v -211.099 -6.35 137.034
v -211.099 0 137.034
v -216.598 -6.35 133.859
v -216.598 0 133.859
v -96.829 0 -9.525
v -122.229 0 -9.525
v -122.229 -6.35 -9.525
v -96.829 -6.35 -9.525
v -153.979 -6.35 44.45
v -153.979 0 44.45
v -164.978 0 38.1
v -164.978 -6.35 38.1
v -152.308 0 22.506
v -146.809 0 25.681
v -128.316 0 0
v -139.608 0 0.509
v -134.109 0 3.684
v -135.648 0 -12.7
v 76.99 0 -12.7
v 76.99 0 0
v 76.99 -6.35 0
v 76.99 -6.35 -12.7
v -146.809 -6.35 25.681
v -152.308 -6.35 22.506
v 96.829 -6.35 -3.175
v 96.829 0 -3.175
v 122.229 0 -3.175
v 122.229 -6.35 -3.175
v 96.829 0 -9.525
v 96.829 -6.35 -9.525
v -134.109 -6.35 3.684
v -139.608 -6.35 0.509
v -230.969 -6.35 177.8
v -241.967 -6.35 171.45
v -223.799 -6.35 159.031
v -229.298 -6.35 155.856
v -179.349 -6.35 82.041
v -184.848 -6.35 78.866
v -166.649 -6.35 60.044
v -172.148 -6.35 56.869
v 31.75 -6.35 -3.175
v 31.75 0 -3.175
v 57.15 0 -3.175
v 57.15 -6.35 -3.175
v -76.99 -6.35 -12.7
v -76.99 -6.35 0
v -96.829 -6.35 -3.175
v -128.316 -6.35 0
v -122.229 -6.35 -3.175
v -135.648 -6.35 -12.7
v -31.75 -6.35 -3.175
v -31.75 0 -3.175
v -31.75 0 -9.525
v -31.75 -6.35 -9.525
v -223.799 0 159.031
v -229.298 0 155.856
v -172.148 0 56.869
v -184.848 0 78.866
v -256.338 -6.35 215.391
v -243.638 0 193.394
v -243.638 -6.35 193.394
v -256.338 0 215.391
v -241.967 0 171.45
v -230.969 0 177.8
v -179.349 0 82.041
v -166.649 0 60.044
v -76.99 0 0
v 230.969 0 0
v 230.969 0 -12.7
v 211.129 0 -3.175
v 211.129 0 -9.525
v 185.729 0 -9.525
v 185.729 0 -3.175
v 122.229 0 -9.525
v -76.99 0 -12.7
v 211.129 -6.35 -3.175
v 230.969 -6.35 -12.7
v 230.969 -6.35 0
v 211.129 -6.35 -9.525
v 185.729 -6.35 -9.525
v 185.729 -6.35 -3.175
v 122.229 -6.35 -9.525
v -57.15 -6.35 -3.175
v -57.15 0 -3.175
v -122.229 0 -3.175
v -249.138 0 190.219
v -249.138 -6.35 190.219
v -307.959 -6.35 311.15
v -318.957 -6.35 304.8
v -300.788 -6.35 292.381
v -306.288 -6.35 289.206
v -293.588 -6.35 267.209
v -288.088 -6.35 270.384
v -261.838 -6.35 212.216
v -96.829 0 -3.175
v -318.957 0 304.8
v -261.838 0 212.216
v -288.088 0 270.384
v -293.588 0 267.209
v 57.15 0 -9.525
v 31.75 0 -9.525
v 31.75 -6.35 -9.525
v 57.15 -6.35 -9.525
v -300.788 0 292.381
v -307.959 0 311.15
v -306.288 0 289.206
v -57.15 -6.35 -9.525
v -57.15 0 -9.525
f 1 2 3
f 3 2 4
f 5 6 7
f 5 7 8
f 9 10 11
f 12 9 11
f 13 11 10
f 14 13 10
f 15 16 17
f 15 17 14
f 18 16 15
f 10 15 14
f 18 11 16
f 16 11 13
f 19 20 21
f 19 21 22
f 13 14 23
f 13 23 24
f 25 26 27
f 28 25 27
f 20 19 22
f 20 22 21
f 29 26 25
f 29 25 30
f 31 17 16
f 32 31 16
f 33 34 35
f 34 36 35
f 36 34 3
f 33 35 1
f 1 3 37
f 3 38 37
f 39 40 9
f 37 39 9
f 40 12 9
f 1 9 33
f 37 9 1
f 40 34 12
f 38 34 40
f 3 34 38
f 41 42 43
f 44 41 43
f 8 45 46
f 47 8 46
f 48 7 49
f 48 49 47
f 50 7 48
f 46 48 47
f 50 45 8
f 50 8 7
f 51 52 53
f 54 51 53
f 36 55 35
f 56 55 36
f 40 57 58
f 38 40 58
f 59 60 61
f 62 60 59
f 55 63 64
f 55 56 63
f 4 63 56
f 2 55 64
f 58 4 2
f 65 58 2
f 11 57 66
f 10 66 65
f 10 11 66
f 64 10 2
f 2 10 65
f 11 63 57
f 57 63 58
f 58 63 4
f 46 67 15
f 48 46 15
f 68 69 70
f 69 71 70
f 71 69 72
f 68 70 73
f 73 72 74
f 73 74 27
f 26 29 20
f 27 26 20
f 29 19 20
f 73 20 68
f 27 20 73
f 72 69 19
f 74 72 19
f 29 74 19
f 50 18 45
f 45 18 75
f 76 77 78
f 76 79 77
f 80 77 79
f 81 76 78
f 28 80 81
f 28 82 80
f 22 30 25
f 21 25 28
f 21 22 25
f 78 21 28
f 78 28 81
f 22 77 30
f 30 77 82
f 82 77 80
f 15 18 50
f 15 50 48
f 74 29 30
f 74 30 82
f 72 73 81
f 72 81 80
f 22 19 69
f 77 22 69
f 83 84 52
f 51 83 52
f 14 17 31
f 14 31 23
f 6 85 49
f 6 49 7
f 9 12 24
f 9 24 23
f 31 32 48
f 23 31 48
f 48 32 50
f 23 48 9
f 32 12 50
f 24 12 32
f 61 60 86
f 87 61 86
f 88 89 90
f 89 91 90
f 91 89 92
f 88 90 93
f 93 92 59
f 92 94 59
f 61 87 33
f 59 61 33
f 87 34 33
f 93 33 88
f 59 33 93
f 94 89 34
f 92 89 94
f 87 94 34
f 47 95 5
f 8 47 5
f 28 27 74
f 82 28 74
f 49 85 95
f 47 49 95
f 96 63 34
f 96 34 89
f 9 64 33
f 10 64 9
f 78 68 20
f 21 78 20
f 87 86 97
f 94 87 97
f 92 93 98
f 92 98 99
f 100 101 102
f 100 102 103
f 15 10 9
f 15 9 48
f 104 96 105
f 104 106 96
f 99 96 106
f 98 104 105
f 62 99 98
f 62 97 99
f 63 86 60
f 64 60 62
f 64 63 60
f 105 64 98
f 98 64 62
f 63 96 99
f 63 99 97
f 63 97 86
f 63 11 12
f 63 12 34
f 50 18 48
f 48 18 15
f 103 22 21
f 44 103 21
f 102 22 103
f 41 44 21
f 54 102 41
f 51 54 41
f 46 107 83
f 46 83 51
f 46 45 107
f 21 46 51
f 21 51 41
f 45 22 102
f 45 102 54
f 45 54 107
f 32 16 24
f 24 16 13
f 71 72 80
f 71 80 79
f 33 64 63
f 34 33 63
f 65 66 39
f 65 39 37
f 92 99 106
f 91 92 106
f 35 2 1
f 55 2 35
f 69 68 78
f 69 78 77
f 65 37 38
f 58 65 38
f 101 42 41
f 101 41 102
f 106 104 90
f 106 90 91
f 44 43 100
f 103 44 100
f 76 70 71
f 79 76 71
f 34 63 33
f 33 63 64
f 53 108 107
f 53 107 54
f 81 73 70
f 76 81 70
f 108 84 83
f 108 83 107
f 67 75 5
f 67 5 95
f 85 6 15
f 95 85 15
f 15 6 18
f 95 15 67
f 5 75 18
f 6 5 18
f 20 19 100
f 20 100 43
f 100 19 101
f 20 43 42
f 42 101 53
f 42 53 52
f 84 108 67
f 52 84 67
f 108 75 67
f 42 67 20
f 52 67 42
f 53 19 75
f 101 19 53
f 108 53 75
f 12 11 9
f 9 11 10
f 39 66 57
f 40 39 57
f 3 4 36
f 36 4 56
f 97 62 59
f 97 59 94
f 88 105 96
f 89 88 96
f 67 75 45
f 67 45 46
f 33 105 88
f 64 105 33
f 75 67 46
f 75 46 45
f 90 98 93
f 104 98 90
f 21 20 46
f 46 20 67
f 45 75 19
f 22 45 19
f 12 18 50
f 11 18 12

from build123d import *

# Parameters (mm, degrees)
BOSS_EXTRUDE1_DEPTH = 6.35
CUT_EXTRUDE4_DEPTH  = 155.110195964
BOSS_EXTRUDE4_DEPTH = 6.35
CIRPATTERN1_COUNT   = 2
CIRPATTERN1_ANGLE   = 60
SKETCH12_W          = 153.979316792
SKETCH12_H          = 120.65
CUT_EXTRUDE5_DEPTH  = 155.110195964
SKETCH13_W          = 25.4
SKETCH13_H          = 6.35
CUT_EXTRUDE6_DEPTH  = 90.126497182
LPATTERN1_COUNT     = 5
LPATTERN1_PITCH     = 153.979316882
LPATTERN1_2_COUNT   = 2
LPATTERN1_2_PITCH   = 153.979316882
SKETCH14_W          = 25.4
SKETCH14_H          = 6.35
CUT_EXTRUDE7_DEPTH  = 695.360232872
CUT_EXTRUDE8_DEPTH  = 600.270912242


with BuildPart() as part:
    # Sketch1 → Boss-Extrude1 (new body)
    with BuildSketch(Plane(origin=(0, 0, 0), x_dir=(1, 0, 0), z_dir=(0, 1, 0))):
        Polygon((-76.989658396, 0), (0, -44.45), (76.989658396, 0), (76.989658396, 88.9), (0, 133.35), (-76.989658396, 88.9), align=None)
    extrude(amount=-BOSS_EXTRUDE1_DEPTH)

    # Sketch10 → Cut-Extrude4 (cut, through all)
    with BuildSketch(Plane(origin=(0, 0, 0), x_dir=(1, 0, 0), z_dir=(0, 1, 0))):
        Polygon((-21.997045256, -31.75), (-13.322783942, -29.425738686), (-35.319829198, -16.725738686), (-38.494829198, -22.225), align=None)
    cut_extrude4 = extrude(amount=-CUT_EXTRUDE4_DEPTH, mode=Mode.SUBTRACT)

    # Sketch11 → Boss-Extrude4 (add)
    with BuildSketch(Plane(origin=(0, 0, 0), x_dir=(1, 0, 0), z_dir=(0, 1, 0))):
        Polygon((-38.494829198, -22.225), (-41.669829198, -27.724261314), (-63.666874454, -15.024261314), (-54.99261314, -12.7), align=None)
    boss_extrude4 = extrude(amount=-BOSS_EXTRUDE4_DEPTH)

    # CirPattern1: Cut-Extrude4, Boss-Extrude4 ×2 about axis
    cirpattern1_axis = Axis((0, 0, -44.45), (0, 1, 0))
    add([cut_extrude4.rotate(cirpattern1_axis, i * CIRPATTERN1_ANGLE / (CIRPATTERN1_COUNT - 1)) for i in range(1, CIRPATTERN1_COUNT)], mode=Mode.SUBTRACT)
    add([boss_extrude4.rotate(cirpattern1_axis, i * CIRPATTERN1_ANGLE / (CIRPATTERN1_COUNT - 1)) for i in range(1, CIRPATTERN1_COUNT)])

    # Sketch12 → Cut-Extrude5 (cut, through all)
    with BuildSketch(Plane(origin=(0, 0, 0), x_dir=(1, 0, 0), z_dir=(0, 1, 0))):
        with Locations((0, 73.025)):
            Rectangle(SKETCH12_W, SKETCH12_H)
    extrude(amount=-CUT_EXTRUDE5_DEPTH, mode=Mode.SUBTRACT)

    # Sketch13 → Cut-Extrude6 (cut, through all)
    with BuildSketch(Plane(origin=(0, 0, 0), x_dir=(1, 0, 0), z_dir=(0, 1, 0))):
        with Locations((-44.45, 6.35)):
            Rectangle(SKETCH13_W, SKETCH13_H)
        with Locations((44.45, 6.35)):
            Rectangle(SKETCH13_W, SKETCH13_H)
    extrude(amount=-CUT_EXTRUDE6_DEPTH, mode=Mode.SUBTRACT)


with BuildPart() as lpattern1_1:
    # LPattern1: pattern copy
    add(part.part.moved(Location(Vector(1, 0, 0) * (1 * LPATTERN1_PITCH))))


with BuildPart() as lpattern1_2:
    # LPattern1: pattern copy
    add(part.part.moved(Location(Vector(1, 0, 0) * (2 * LPATTERN1_PITCH))))


with BuildPart() as lpattern1_3:
    # LPattern1: pattern copy
    add(part.part.moved(Location(Vector(1, 0, 0) * (3 * LPATTERN1_PITCH))))


with BuildPart() as lpattern1_4:
    # LPattern1: pattern copy
    add(part.part.moved(Location(Vector(1, 0, 0) * (4 * LPATTERN1_PITCH))))


with BuildPart() as lpattern1_2_1:
    # LPattern1 2: pattern copy
    add(part.part.moved(Location(Vector(-1, 0, 0) * (1 * LPATTERN1_2_PITCH))))


with BuildPart() as cut_extrude7_tool:
    # Sketch14 → Cut-Extrude7 (new, through all)
    # profile 1 of 2: a face of its own
    with BuildSketch(Plane(origin=(0, 0, 0), x_dir=(1, 0, 0), z_dir=(0, 1, 0))):
        Polygon((593.920222272, -31.75), (615.917267528, -44.45), (637.914312784, -31.75), (635.59005147, -40.424261314), (657.587096726, -27.724261314), (651.237096726, -16.725738686), (673.234141982, -4.025738686), (670.909880668, -12.7), (692.906925924, 0), (692.906925924, 12.7), (597.586396481, 12.7), (580.59743833, -16.725738686), (602.594483586, -29.425738686), align=None)
        with Locations((660.367267528, 6.35)):
            Rectangle(SKETCH14_W, SKETCH14_H, mode=Mode.SUBTRACT)
    # profile 2 of 2: a face of its own
    with BuildSketch(Plane(origin=(0, 0, 0), x_dir=(1, 0, 0), z_dir=(0, 1, 0))):
        Polygon((-230.968975278, -44.45), (-153.979316882, -44.45), (-134.30653294, -40.424261314), (-112.309487684, -27.724261314), (-135.648445835, 12.7), (-230.968975278, 12.7), align=None)
    extrude(amount=-CUT_EXTRUDE7_DEPTH)


with BuildPart() as lpattern1_4_1:
    add(lpattern1_4.part)

    # Cut-Extrude7: cut by cut_extrude7_tool
    add(cut_extrude7_tool.part, mode=Mode.SUBTRACT)


with BuildPart() as lpattern1_2_1_1:
    add(lpattern1_2_1.part)

    # Cut-Extrude7: cut by cut_extrude7_tool
    add(cut_extrude7_tool.part, mode=Mode.SUBTRACT)


with BuildPart() as cut_extrude8_tool:
    # Sketch15 → Cut-Extrude8 (new, through all)
    with BuildSketch(Plane(origin=(0, 0, 0), x_dir=(1, 0, 0), z_dir=(0, 1, 0))):
        Polygon((-156.381024632, 0), (-156.381024632, -63.5), (618.318975368, -63.5), (618.318975368, 12.7), (230.968975368, 12.7), (230.968975368, 0), align=None)
    extrude(amount=-CUT_EXTRUDE8_DEPTH)


with BuildPart() as part_1:
    add(part.part)

    # Cut-Extrude8: cut by cut_extrude8_tool
    add(cut_extrude8_tool.part, mode=Mode.SUBTRACT)


with BuildPart() as lpattern1_1_1:
    add(lpattern1_1.part)

    # Cut-Extrude8: cut by cut_extrude8_tool
    add(cut_extrude8_tool.part, mode=Mode.SUBTRACT)


with BuildPart() as lpattern1_2_2:
    add(lpattern1_2.part)

    # Cut-Extrude8: cut by cut_extrude8_tool
    add(cut_extrude8_tool.part, mode=Mode.SUBTRACT)


with BuildPart() as lpattern1_3_1:
    add(lpattern1_3.part)

    # Cut-Extrude8: cut by cut_extrude8_tool
    add(cut_extrude8_tool.part, mode=Mode.SUBTRACT)


with BuildPart() as lpattern1_4_2:
    add(lpattern1_4_1.part)

    # Cut-Extrude8: cut by cut_extrude8_tool
    add(cut_extrude8_tool.part, mode=Mode.SUBTRACT)


with BuildPart() as lpattern1_2_1_2:
    add(lpattern1_2_1_1.part)

    # Cut-Extrude8: cut by cut_extrude8_tool
    add(cut_extrude8_tool.part, mode=Mode.SUBTRACT)


with BuildPart() as body_4:
    # Mirror1: mirrored copy
    add(lpattern1_2_1_2.part.mirror(Plane(origin=(-96.237073062, -6.35, 55.562500039), x_dir=(0.4999999999999999, 0, 0.8660254037844387), z_dir=(0.8660254037844387, 0, -0.4999999999999999))))


with BuildPart() as body_5:
    # Mirror1 2: mirrored copy
    add(part_1.part.mirror(Plane(origin=(-96.237073062, -6.35, 55.562500039), x_dir=(0.4999999999999999, 0, 0.8660254037844387), z_dir=(0.8660254037844387, 0, -0.4999999999999999))))


with BuildPart() as body_6:
    # Mirror1 3: mirrored copy
    add(lpattern1_1_1.part.mirror(Plane(origin=(-96.237073062, -6.35, 55.562500039), x_dir=(0.4999999999999999, 0, 0.8660254037844387), z_dir=(0.8660254037844387, 0, -0.4999999999999999))))


solid = Compound([part_1.part, lpattern1_1_1.part, lpattern1_2_1_2.part, body_4.part, body_5.part, body_6.part])
